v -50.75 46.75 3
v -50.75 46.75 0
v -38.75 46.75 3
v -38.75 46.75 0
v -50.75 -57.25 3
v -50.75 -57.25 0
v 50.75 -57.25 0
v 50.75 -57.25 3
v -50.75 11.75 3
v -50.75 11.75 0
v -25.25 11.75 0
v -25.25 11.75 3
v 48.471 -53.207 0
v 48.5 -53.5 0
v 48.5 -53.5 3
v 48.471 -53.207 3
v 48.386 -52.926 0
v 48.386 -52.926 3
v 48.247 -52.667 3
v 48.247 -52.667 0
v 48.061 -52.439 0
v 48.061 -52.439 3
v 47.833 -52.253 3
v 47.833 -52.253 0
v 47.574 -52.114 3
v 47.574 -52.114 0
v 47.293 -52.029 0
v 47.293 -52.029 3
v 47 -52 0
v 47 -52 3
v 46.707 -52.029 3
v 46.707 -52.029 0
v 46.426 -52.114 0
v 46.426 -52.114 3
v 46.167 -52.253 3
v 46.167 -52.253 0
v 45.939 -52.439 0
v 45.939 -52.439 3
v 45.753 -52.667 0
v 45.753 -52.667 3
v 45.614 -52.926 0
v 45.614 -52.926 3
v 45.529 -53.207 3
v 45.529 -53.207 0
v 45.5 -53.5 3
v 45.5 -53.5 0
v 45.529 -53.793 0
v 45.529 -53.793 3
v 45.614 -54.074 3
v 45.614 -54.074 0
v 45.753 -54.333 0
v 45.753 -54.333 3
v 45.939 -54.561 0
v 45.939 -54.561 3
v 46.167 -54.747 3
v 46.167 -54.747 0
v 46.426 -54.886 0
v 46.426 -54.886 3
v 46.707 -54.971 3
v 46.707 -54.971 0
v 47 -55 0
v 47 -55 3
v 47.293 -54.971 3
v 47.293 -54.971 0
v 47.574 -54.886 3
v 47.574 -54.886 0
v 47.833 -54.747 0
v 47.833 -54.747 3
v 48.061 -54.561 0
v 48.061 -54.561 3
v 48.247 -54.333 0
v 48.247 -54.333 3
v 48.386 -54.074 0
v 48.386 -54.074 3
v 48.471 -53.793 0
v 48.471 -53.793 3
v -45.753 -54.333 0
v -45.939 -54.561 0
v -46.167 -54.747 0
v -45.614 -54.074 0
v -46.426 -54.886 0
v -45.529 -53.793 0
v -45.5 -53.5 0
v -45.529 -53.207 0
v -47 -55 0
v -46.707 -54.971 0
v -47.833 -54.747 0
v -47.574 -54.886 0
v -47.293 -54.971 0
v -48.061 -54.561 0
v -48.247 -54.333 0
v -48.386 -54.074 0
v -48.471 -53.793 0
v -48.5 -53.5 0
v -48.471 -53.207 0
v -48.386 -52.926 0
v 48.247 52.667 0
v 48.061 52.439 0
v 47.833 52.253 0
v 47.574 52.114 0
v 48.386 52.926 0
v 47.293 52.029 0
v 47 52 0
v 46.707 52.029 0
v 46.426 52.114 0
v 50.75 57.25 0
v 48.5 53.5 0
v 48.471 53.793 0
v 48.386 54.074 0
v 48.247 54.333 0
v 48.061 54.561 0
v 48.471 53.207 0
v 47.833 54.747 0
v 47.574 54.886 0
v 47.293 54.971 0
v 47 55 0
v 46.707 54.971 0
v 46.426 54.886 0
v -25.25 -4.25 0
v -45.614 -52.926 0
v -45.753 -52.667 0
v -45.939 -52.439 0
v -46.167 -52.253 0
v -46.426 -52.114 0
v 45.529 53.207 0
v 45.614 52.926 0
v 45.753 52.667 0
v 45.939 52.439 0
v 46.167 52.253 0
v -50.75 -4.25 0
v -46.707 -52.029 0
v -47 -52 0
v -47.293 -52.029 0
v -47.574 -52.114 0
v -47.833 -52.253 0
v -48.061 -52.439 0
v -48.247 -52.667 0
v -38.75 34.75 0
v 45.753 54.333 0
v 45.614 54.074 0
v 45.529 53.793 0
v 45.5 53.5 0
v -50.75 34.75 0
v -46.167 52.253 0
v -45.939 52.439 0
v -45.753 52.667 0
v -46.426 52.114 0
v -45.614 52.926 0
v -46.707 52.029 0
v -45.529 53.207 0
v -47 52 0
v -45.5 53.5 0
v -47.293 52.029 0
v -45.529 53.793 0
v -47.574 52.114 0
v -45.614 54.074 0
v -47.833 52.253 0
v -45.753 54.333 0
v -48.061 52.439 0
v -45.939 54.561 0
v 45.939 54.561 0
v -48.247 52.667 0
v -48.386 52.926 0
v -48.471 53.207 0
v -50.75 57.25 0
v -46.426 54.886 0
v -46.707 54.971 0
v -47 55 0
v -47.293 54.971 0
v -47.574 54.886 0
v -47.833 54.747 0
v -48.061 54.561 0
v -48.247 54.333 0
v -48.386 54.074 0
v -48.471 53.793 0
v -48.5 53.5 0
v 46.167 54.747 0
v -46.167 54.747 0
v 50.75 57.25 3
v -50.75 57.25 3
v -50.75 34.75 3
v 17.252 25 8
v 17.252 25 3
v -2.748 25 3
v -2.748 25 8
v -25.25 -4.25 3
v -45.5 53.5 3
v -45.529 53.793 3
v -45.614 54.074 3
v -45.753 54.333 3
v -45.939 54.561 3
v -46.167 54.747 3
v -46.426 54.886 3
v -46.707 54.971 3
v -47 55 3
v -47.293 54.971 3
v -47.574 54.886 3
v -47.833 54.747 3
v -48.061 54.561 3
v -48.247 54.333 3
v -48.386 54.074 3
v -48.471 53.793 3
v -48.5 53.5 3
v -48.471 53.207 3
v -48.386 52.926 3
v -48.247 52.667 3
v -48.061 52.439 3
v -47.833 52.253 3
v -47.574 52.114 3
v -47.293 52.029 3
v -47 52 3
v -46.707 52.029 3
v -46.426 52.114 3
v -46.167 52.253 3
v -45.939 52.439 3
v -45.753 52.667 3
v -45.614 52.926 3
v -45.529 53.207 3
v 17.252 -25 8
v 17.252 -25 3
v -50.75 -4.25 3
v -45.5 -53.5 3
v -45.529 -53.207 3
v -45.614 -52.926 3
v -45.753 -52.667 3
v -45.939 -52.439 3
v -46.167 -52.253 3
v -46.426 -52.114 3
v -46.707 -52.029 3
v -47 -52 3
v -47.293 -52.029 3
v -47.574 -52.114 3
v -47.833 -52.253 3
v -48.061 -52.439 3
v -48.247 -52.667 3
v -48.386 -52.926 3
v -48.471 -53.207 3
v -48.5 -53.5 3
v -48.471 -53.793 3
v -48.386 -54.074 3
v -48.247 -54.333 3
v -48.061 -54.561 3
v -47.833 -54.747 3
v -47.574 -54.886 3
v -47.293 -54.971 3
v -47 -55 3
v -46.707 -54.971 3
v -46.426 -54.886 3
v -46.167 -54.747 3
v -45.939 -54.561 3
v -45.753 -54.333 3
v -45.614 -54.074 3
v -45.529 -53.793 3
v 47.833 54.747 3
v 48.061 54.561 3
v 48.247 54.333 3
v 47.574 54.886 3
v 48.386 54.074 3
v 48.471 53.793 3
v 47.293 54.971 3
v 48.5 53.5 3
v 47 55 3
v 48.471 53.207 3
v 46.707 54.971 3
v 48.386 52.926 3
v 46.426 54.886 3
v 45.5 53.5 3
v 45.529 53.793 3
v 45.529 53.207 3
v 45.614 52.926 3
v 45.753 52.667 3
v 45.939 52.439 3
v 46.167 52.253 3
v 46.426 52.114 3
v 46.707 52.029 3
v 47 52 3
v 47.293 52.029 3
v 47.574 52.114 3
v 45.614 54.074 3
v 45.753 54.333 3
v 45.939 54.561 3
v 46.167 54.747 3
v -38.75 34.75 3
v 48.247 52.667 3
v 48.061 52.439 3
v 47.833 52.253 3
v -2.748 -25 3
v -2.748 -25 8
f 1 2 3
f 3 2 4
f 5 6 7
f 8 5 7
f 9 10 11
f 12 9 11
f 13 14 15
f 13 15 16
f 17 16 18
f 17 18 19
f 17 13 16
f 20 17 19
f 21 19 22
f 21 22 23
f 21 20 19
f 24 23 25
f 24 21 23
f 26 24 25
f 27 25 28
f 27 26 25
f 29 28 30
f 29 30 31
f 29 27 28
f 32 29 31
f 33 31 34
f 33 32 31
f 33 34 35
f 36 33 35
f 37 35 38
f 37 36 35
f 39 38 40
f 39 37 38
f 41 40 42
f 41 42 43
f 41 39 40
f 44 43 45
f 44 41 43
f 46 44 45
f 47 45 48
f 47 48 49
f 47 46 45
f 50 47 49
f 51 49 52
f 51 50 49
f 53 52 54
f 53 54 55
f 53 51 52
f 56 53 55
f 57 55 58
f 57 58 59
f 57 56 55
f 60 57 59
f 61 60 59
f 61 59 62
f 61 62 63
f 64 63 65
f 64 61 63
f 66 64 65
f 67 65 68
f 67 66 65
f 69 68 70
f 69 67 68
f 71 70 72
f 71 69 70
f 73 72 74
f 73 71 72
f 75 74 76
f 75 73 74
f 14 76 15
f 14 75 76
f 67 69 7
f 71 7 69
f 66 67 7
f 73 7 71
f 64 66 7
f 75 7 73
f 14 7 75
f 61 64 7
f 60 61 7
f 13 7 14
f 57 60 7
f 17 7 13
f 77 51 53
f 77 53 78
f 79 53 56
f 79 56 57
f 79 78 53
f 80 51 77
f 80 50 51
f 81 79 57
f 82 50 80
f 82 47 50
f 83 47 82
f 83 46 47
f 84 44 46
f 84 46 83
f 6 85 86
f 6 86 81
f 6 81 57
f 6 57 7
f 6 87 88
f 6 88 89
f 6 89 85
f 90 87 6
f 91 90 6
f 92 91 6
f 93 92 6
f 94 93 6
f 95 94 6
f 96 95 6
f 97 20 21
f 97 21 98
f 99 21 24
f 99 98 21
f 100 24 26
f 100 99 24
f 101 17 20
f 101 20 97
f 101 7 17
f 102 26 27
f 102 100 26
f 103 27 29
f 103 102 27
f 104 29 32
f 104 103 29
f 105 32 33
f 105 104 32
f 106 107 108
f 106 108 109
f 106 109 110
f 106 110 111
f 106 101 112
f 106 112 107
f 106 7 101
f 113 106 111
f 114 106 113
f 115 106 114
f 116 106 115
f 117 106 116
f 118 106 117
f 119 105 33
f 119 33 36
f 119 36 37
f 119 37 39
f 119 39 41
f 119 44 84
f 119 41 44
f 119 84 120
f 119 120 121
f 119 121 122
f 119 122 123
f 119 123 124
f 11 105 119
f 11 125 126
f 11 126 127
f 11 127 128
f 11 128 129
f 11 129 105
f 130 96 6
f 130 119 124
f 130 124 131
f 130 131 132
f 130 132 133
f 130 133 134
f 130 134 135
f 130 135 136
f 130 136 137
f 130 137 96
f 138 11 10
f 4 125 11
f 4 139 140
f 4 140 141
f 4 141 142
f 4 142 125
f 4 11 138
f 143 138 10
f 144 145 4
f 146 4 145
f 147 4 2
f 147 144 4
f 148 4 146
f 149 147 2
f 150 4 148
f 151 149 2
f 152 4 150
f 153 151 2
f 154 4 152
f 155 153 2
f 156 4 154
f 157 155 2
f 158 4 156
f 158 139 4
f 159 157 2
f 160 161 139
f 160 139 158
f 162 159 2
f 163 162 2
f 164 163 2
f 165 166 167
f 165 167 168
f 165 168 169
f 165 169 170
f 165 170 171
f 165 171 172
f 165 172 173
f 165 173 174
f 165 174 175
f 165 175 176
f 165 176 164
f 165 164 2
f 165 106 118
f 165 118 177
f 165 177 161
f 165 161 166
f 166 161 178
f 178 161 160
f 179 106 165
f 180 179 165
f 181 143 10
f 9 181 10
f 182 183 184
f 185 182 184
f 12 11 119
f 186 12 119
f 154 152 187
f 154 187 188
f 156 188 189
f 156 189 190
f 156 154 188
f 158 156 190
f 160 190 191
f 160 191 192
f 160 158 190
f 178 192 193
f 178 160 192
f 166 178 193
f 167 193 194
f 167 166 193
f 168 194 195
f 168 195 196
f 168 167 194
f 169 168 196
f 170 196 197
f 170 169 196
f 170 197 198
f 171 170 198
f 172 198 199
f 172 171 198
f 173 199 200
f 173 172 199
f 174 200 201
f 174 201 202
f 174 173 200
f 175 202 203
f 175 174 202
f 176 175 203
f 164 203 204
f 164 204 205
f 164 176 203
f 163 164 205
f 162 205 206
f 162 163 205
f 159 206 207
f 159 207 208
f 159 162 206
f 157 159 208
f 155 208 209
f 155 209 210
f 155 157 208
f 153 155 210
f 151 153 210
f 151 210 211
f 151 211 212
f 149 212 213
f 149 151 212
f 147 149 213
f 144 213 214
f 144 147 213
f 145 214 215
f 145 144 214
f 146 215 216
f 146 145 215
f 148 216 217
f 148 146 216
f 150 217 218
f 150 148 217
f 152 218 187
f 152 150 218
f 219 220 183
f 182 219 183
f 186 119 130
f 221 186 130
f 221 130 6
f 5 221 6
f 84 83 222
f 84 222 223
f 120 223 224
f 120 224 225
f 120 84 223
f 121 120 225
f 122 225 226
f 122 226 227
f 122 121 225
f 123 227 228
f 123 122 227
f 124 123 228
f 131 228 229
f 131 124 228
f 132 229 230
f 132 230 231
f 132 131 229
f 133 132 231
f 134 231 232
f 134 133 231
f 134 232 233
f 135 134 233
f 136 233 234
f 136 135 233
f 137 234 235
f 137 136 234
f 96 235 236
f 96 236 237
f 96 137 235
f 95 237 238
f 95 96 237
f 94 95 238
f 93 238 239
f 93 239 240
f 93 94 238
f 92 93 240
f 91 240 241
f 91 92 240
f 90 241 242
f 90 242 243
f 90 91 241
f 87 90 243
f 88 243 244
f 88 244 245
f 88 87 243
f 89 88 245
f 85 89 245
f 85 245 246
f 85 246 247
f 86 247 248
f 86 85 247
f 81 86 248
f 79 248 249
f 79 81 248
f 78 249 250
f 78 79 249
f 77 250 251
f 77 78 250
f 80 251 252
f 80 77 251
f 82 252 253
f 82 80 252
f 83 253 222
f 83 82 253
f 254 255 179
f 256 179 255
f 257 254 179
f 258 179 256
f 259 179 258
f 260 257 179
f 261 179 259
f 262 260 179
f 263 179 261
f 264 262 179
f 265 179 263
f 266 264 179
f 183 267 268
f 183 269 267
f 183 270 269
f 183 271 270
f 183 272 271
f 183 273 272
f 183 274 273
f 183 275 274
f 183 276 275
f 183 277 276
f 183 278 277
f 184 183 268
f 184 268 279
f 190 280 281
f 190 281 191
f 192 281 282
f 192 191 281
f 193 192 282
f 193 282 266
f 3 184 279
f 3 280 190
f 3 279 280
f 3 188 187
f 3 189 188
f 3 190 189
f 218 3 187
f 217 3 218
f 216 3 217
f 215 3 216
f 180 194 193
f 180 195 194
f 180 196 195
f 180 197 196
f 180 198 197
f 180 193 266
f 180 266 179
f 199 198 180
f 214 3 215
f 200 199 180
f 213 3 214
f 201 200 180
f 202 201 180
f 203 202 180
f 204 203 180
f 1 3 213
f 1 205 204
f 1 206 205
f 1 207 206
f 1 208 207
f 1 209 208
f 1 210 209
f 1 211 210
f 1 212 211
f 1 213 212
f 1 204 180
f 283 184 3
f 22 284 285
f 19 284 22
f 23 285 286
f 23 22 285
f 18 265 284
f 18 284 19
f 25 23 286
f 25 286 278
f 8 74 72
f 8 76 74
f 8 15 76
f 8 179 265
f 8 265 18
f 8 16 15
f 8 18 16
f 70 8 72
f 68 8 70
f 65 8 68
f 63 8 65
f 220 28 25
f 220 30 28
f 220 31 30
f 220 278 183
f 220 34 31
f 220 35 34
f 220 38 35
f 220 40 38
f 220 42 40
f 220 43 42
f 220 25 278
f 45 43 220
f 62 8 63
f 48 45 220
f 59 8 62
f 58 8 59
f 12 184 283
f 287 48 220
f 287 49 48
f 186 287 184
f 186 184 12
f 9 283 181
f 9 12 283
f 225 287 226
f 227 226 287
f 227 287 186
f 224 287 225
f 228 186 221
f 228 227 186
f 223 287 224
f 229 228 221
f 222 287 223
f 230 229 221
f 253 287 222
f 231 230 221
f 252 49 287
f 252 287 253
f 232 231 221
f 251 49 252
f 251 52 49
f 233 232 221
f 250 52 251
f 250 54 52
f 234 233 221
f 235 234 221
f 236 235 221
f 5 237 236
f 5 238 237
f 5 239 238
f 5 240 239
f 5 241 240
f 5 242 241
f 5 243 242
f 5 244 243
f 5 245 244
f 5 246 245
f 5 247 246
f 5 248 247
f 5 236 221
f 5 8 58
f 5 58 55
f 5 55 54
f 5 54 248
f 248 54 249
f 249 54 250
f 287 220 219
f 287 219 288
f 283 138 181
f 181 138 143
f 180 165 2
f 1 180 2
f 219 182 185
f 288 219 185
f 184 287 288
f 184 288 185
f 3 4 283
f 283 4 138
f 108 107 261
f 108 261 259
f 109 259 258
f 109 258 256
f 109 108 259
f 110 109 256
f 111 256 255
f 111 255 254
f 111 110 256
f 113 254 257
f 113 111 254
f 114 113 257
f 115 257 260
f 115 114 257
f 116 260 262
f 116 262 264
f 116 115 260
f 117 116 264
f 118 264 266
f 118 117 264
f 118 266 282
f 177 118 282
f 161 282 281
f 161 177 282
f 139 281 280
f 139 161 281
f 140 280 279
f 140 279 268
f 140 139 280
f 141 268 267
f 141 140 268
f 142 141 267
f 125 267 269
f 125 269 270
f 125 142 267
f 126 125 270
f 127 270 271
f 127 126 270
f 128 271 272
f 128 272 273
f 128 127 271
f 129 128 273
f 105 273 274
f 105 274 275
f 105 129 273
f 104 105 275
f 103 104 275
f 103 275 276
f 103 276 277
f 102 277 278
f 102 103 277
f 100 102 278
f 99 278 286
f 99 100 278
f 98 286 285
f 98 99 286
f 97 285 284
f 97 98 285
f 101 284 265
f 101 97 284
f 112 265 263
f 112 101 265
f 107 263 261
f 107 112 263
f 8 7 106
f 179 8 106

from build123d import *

# Parameters (mm, degrees)
SKETCH1_R           = 1.5
BOSS_EXTRUDE1_DEPTH = 3
SKETCH2_W           = 20
SKETCH2_H           = 50
BOSS_EXTRUDE2_DEPTH = 8


with BuildPart() as part:
    # Sketch1 → Boss-Extrude1 (new body)
    with BuildSketch(Plane(origin=(0, 0, 0), x_dir=(-1, 0, 0), z_dir=(0, 0, 1))):
        Polygon((50.75, 10.25), (50.75, 48.25), (50.75, 57.25), (-50.75, 57.25), (-50.75, -14.25), (-50.75, -41.25), (-50.75, -57.25), (-43.25, -57.25), (29.75, -57.25), (50.75, -57.25), (50.75, -46.75), (38.75, -46.75), (38.75, -34.75), (50.75, -34.75), (50.75, -29.75), (50.75, -20.75), (50.75, -11.75), (25.25, -11.75), (25.25, 4.25), (50.75, 4.25), align=None)
        with Locations(Location((-47, -53.5, 0), (0, 0, 180))):
            Circle(SKETCH1_R, mode=Mode.SUBTRACT)
        with Locations(Location((-47, 53.5, 0), (0, 0, 180))):
            Circle(SKETCH1_R, mode=Mode.SUBTRACT)
        with Locations(Location((47, 53.5, 0), (0, 0, 180))):
            Circle(SKETCH1_R, mode=Mode.SUBTRACT)
        with Locations(Location((47, -53.5, 0), (0, 0, 180))):
            Circle(SKETCH1_R, mode=Mode.SUBTRACT)
    extrude(amount=BOSS_EXTRUDE1_DEPTH)

    # Sketch2 → Boss-Extrude2 (add)
    with BuildSketch(Plane(origin=(0, 0, 0), x_dir=(-1, 0, 0), z_dir=(0, 0, -1))):
        with Locations((-7.252332969, 0)):
            Rectangle(SKETCH2_W, SKETCH2_H)
    extrude(amount=-BOSS_EXTRUDE2_DEPTH)


solid = part.part
